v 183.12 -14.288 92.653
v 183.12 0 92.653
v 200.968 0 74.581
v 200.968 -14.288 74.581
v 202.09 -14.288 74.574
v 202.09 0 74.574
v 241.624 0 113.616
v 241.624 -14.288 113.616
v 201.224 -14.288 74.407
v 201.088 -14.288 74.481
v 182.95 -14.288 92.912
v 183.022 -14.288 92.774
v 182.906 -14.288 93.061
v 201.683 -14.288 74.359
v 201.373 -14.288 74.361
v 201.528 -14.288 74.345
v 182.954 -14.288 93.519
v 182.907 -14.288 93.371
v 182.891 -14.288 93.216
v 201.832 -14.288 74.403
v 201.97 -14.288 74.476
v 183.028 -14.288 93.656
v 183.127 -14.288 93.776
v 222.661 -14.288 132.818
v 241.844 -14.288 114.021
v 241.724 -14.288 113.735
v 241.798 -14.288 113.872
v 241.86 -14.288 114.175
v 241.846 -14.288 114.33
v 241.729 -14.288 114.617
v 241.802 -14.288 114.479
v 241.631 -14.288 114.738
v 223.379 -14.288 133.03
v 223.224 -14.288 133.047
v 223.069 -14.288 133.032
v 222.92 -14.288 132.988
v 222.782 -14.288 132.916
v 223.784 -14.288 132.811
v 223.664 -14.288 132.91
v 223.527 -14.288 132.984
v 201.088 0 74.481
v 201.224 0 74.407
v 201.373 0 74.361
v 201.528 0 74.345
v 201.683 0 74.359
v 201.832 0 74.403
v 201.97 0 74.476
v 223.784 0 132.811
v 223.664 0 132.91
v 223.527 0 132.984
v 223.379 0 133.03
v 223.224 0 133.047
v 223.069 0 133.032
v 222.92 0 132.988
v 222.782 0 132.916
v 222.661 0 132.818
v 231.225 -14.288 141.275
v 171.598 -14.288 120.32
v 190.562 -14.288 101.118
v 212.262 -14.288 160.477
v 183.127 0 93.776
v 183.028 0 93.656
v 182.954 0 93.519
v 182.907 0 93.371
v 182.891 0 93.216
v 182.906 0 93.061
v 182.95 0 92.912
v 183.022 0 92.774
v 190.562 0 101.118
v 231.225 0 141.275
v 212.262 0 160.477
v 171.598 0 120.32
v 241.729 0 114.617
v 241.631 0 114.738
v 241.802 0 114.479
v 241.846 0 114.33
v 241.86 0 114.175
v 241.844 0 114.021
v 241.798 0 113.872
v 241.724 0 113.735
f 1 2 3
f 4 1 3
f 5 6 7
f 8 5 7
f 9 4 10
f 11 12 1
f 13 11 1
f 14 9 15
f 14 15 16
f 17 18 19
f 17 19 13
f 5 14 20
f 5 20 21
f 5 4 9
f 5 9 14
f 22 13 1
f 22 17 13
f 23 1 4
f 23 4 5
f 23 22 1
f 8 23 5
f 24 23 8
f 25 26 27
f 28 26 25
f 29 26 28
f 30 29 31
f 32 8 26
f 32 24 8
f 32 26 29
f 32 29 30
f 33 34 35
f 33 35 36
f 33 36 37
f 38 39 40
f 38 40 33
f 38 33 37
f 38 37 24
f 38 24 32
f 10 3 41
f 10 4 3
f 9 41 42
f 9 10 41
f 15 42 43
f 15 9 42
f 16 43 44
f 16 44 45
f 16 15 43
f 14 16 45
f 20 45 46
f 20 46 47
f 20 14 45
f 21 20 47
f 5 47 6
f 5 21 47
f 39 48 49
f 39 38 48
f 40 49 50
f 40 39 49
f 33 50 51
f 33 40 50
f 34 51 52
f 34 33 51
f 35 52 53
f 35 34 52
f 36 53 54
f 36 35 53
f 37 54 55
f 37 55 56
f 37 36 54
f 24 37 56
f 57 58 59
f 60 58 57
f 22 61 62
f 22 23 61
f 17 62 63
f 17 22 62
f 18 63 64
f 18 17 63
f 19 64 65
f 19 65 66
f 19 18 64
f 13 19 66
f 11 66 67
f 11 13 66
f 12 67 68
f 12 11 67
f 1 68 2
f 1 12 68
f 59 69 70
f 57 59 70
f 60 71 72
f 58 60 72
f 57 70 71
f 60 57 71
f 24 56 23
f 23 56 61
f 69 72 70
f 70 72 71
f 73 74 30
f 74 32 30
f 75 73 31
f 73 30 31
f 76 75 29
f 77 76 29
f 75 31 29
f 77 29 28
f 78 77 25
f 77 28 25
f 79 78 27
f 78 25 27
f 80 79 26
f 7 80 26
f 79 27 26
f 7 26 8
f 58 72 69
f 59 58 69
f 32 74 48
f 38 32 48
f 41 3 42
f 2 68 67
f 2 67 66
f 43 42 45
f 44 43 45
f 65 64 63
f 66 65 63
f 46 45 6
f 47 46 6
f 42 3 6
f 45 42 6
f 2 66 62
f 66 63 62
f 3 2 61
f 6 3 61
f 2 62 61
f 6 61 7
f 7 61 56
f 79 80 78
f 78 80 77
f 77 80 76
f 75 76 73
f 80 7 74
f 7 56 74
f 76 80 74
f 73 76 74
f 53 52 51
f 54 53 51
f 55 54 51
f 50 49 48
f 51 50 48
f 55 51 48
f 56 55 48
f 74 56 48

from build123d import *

# Parameters (mm, degrees)
F3_DEPTH = 14.2875
F4_R     = 0.79375
F6_DEPTH = 14.2875


with BuildPart() as f3:
    # F2 (on Front) → F3 (new body)
    with BuildSketch(Plane.XZ):
        Polygon((242.189038, 114.173276), (223.225822, 133.3754), (182.5625, 93.218), (201.525717, 74.015876), align=None)
    extrude(amount=F3_DEPTH)

    # F4
    f4_edges = [f3.edges().sort_by_distance(p)[0] for p in [
        (201.525717, -7.14375, 74.015876),
        (182.5625, -7.14375, 93.218),
        (242.189038, -7.14375, 114.173276),
        (223.225822, -7.14375, 133.3754),
    ]]
    fillet(f4_edges, radius=F4_R)


with BuildPart() as f6:
    # F5 (on Front) → F6 (new body)
    with BuildSketch(Plane.XZ):
        Polygon((231.225012, 141.275067), (212.261796, 160.477191), (171.598474, 120.319791), (190.561691, 101.117667), align=None)
    extrude(amount=F6_DEPTH)


solid = Compound([f3.part, f6.part])
